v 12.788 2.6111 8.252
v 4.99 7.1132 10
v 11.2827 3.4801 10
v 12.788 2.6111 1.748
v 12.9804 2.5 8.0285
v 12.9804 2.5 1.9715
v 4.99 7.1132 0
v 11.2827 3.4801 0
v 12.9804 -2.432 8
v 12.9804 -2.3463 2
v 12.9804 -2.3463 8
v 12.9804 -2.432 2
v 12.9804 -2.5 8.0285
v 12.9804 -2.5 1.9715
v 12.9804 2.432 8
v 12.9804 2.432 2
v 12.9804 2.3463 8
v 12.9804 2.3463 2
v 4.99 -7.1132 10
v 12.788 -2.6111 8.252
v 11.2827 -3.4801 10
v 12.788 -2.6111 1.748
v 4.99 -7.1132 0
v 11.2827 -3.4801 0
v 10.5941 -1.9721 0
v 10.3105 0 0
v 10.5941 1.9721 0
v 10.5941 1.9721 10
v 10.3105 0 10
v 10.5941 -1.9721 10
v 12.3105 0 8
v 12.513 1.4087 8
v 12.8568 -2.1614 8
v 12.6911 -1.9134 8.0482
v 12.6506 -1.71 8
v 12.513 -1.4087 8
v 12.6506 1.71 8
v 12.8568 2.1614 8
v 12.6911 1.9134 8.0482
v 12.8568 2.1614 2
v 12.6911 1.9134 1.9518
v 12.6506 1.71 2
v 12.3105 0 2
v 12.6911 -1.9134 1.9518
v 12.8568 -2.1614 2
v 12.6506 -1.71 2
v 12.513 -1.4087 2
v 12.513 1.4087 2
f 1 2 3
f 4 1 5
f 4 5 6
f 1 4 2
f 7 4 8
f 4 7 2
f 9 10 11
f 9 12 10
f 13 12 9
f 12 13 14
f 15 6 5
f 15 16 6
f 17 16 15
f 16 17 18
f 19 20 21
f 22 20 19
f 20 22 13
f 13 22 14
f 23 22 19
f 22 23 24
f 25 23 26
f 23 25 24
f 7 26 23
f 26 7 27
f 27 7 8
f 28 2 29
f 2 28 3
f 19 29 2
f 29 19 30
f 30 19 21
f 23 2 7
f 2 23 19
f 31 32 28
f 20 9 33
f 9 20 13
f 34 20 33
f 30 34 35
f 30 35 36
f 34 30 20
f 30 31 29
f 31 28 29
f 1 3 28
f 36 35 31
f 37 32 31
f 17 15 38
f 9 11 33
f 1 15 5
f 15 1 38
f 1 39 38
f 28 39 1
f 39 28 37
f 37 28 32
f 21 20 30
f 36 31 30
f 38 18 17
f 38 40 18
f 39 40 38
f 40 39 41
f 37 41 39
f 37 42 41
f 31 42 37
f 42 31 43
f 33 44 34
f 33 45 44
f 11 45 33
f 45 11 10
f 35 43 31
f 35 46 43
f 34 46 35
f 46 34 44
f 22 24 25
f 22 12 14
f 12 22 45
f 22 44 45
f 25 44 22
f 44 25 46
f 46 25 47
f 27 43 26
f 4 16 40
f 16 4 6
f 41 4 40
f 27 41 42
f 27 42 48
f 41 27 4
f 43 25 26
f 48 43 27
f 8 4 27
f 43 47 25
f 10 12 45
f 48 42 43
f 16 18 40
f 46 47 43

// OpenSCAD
// file: shapes/torus.scad
torus();

module torus(
    h = 2,     
    r = 10,   
    sides = $fn)
{
    tube_radius = h / 2;
    inside_radius = r - tube_radius;
    //translate([r,r,thickness_radius])
    translate([0,0,tube_radius])
    rotate_extrude()
    translate([inside_radius, 0, 0])
    circle(r = tube_radius, $fn = sides);
}
// file: shapes/inverted_chamfer_cylinder.scad
use <torus.scad>;

default_chamfer_radius = 1;
default_extra_margin_bottom = 10;
default_extra_margin_top = 10;

inverted_chamfer_cylinder();

module inverted_chamfer_cylinder(
    h = 10, 
    r = undef, 
    d = 10,
    chamfer_radius = undef,
    extra_margin_bottom = undef,
    extra_margin_top = undef)
{    

    function _chamfer_radius() = (chamfer_radius != undef) ? chamfer_radius : default_chamfer_radius;
    function _extra_margin_bottom() = (extra_margin_bottom != undef) ? extra_margin_bottom : default_extra_margin_bottom;
    function _extra_margin_top() = (extra_margin_top != undef) ? extra_margin_top : default_extra_margin_top;
    
    function _r() = 
        (r) ? r : 
        (d) ? d / 2 :
        "error";

    function _d() = 
        (r) ? r * 2 : 
        (d) ? d :
        "error";
    
    union()
    {
        r = _r();
        inverted_chamfer_rim_top();        
        cylinder(h=h, r=r);
        inverted_chamfer_rim_bottom();
    }
    
    module inverted_chamfer_rim_top()
    {
        extra = _extra_margin_top();
        chamfer_radius = _chamfer_radius();
        r = _r();
        r1 = r;
        r2 = r + chamfer_radius;

        hull()
        {
            translate([0, 0, h - chamfer_radius])
            cylinder(h = chamfer_radius, r1 = r1, r2 = r2);

            translate([0, 0, h])
            cylinder(h=extra, r=r + chamfer_radius);
        }
    }
    
    module inverted_chamfer_rim_bottom()
    {
        extra = _extra_margin_bottom();
        chamfer_radius = _chamfer_radius();
        r = _r();
        r1 = r + chamfer_radius;
        r2 = r;
        
        hull()
        {
            cylinder(h = chamfer_radius, r1 = r1, r2 = r2);

            translate([0, 0, -extra])
            cylinder(h=extra, r=r + chamfer_radius);
        }
    }
}
// main file
use <shapes/inverted_chamfer_cylinder.scad>;

fillet();

module fillet(
    leg_diameter = 20,
    leg_qty = 3,
    leg_height = 10,
    chamfer_radius = 2,
    fillet_radius = 5)
{
    outer_radius = leg_diameter / 2;
    // the cube needs to extend only to where the arc of the circle intersects the leg_qty
    
    body_radius = outer_radius;
    body_minor_arc = 360 / leg_qty;
    body_minor_arc_half = body_minor_arc / 2;
    
    a = fillet_radius * cos(body_minor_arc_half);
    b = fillet_radius * sin(body_minor_arc_half);
    c = a * tan(90 - body_minor_arc_half);
    
    d = body_radius / (cos(90-body_minor_arc_half));
    
    cumulative_error_mesh_adjust = 0.01;
    leg_intersection = d;
    fillet_width = (a * 2);
    fillet_intersecting_radius = c + d;
    fillet_center = b + c + d;
    fillet_distance = fillet_intersecting_radius;
    fillet_arc = body_minor_arc_half;
    
    translate([-cumulative_error_mesh_adjust,0,0])
    difference()
    {
        fillet_polygon();
        
        translate([fillet_center, 0, 0])
        inverted_chamfer_cylinder(
            h = leg_height,
            r = fillet_radius,
            chamfer_radius = chamfer_radius);
    }
    
    module fillet_polygon()
    {
        erase_cube_margin = 1;
        erase_cube_x = (body_radius / 2) + erase_cube_margin;
        erase_cube_y = leg_diameter + erase_cube_margin;
        erase_cube_z = leg_height + erase_cube_margin;

        difference()
        {
            fillet_polygon_full();
            
            translate([-erase_cube_margin, -erase_cube_y/2, -erase_cube_margin/2])
            cube([erase_cube_x, erase_cube_y, erase_cube_z]);
        }
    }
    
    module fillet_polygon_full()
    {
        hull()
        {
            translate([0, -fillet_width/2, 0])
            cube([fillet_distance, fillet_width, leg_height]);
            
            translate([-0.1, -(leg_diameter/2), 0])
            cube([0.1, leg_diameter, leg_height]);
        }
    }
}
